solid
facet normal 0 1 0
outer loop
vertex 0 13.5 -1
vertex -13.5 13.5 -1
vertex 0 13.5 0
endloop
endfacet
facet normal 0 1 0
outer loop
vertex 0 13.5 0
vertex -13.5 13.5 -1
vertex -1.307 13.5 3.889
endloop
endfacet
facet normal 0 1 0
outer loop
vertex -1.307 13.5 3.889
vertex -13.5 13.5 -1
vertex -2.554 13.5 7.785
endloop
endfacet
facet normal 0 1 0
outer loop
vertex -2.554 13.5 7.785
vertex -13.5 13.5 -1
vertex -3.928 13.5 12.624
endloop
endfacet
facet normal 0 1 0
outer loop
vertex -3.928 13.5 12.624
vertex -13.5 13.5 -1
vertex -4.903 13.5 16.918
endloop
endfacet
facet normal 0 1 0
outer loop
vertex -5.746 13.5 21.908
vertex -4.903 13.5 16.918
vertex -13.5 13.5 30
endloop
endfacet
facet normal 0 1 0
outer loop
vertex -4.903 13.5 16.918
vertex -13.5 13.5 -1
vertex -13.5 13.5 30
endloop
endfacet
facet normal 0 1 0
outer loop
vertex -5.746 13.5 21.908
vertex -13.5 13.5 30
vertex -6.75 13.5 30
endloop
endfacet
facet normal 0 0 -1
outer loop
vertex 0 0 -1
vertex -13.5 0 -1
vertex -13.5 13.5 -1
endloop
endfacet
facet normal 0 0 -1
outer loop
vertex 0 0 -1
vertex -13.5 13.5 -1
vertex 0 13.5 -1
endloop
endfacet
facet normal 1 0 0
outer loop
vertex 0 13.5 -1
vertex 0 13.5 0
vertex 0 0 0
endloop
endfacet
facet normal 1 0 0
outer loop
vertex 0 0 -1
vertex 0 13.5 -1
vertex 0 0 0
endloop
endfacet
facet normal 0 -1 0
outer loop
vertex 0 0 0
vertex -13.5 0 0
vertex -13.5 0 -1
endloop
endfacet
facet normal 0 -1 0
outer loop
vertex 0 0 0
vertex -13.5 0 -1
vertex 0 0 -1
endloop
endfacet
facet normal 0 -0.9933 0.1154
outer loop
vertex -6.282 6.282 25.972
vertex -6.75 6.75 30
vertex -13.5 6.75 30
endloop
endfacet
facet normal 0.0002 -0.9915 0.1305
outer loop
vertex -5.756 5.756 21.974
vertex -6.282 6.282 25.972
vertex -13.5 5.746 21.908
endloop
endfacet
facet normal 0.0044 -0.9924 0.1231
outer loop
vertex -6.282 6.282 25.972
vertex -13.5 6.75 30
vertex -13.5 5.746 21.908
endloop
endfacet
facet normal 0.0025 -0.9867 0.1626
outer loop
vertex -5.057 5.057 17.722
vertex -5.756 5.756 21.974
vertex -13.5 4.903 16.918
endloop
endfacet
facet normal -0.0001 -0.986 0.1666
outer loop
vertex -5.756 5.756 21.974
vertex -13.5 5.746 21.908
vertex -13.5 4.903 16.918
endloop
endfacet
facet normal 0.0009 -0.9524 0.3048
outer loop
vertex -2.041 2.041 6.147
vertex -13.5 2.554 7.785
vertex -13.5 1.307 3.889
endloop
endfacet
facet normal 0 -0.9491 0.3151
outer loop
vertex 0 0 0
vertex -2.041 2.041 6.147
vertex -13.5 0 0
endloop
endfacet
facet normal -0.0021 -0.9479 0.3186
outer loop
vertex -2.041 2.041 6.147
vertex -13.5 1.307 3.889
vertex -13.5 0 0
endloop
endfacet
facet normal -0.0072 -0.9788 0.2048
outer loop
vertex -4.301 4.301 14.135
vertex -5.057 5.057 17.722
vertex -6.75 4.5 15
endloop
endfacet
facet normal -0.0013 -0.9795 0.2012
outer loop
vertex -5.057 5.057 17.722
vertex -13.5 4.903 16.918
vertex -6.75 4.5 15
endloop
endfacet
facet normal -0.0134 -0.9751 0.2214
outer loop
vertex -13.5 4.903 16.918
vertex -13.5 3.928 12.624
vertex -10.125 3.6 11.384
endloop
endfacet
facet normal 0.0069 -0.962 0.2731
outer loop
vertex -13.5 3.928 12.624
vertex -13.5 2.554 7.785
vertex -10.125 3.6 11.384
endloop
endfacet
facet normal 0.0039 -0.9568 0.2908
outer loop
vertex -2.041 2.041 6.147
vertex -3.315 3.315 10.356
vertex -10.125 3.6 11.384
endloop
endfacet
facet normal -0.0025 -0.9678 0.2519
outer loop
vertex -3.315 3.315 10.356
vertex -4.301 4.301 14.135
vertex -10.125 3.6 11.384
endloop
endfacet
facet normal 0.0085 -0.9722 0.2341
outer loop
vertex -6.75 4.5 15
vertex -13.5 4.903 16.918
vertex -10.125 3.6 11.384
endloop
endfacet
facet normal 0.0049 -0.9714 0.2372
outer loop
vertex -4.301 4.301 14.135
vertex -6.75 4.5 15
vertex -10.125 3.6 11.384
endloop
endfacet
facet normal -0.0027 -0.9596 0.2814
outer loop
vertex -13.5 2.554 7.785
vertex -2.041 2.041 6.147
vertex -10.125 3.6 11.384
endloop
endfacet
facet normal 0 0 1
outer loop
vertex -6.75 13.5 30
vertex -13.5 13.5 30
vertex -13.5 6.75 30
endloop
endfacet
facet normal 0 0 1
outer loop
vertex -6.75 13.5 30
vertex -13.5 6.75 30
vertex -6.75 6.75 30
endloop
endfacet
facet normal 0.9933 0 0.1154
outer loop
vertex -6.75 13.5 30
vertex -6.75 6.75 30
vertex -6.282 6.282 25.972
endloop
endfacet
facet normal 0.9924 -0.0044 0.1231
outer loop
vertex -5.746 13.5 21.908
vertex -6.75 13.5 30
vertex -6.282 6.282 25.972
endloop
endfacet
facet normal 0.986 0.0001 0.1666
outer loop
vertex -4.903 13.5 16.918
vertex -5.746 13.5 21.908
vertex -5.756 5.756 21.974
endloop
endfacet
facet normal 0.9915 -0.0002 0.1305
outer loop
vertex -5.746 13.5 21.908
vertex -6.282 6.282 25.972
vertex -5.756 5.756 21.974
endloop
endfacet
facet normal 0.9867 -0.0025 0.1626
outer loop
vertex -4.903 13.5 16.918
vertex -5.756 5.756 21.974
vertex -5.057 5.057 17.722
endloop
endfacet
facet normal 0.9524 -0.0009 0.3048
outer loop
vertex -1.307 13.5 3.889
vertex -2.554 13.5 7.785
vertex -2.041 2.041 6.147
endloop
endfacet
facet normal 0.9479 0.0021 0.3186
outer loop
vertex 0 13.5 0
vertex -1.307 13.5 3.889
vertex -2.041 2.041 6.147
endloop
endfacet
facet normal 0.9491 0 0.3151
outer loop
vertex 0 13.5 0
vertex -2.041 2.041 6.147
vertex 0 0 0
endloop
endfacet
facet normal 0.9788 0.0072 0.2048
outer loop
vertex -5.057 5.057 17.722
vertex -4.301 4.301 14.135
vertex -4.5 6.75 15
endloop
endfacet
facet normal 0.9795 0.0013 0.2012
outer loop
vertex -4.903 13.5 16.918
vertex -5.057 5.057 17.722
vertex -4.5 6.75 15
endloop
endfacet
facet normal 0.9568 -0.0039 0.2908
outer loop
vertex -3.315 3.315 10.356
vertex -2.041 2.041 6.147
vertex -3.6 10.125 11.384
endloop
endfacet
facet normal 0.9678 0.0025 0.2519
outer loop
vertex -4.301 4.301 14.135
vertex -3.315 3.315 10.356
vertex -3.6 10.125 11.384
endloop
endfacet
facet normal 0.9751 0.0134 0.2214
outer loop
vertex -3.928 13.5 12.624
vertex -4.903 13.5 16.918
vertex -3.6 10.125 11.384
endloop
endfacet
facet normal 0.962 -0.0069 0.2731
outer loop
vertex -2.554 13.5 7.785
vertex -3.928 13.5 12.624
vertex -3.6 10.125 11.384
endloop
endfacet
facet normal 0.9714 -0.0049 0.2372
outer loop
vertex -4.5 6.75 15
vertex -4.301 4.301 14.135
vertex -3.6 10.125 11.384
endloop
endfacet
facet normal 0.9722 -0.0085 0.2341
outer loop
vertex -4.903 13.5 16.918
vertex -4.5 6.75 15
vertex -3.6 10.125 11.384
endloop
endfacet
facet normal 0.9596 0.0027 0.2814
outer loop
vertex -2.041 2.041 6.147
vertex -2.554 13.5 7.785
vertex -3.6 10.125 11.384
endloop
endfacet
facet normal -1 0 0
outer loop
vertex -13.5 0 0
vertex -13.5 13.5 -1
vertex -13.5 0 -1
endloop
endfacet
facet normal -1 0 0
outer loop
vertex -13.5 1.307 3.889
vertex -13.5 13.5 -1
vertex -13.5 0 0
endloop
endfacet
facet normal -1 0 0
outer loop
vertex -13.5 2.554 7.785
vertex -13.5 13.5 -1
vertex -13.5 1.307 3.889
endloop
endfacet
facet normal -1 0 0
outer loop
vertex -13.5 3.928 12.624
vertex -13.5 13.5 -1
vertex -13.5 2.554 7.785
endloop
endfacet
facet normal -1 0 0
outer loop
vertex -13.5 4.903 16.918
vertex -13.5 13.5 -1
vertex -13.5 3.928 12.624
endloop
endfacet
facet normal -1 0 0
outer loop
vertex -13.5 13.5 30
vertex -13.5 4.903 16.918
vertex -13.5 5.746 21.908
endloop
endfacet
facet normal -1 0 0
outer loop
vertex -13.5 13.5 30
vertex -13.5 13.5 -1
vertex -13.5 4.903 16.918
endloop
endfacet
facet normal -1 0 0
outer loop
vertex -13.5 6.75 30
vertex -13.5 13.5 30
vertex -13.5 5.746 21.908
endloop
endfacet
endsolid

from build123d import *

# Parameters (mm, degrees)
F0_W     = 13.5
F0_H     = 13.5
F1_DEPTH = 30
F3_DEPTH = 13.5
F5_DEPTH = 13.5
F6_W     = 13.5
F6_H     = 13.5
F7_DEPTH = 1


# Not quite as in the source:
# - a feature names something its author has since deleted; it is built from what else it names


with BuildPart() as f1:
    # F0 (on Top) → F1 (new body)
    with BuildSketch(Plane.XY):
        with Locations((-6.75, 6.75)):
            Rectangle(F0_W, F0_H)
    extrude(amount=F1_DEPTH)

    # F2 (on face) → F3 (cut)
    with BuildSketch(Plane.XZ):
        with BuildLine():
            add(Edge.make_bspline(
                [(-6.75, 30), (-6.180103722, 24.9803399372), (-5.0311300437, 14.8601522679), (-1.6859534664, 4.9797013811), (0, 0)],
                knots=[0, 0, 0, 0, 0.4960046421, 1, 1, 1, 1], degree=3))
            Line((0, 0), (0, 30))
            Line((0, 30), (-6.75, 30))
        make_face()
    extrude(amount=-F3_DEPTH, mode=Mode.SUBTRACT)

    # F4 (on face) → F5 (cut)
    with BuildSketch(Plane(origin=(-13.5, 0, 0), x_dir=(0, -1, 0), z_dir=(-1, 0, 0))):
        with BuildLine():
            Line((0, 0), (0, 30))
            Line((0, 30), (-6.75, 30))
            add(Edge.make_bspline(
                [(-6.75, 30), (-6.180103722, 24.9803399372), (-5.0311300437, 14.8601522679), (-1.6859534664, 4.9797013811), (0, 0)],
                knots=[0, 0, 0, 0, 0.4960046421, 1, 1, 1, 1], degree=3))
        make_face()
    extrude(amount=-F5_DEPTH, mode=Mode.SUBTRACT)

    # F6 (on face) → F7 (join)
    with BuildSketch(Plane(origin=(0, 0, 0), x_dir=(1, 0, 0), z_dir=(0, 0, -1))):
        with Locations((-6.75, -6.75)):
            Rectangle(F6_W, F6_H)
    extrude(amount=F7_DEPTH)


solid = f1.part
